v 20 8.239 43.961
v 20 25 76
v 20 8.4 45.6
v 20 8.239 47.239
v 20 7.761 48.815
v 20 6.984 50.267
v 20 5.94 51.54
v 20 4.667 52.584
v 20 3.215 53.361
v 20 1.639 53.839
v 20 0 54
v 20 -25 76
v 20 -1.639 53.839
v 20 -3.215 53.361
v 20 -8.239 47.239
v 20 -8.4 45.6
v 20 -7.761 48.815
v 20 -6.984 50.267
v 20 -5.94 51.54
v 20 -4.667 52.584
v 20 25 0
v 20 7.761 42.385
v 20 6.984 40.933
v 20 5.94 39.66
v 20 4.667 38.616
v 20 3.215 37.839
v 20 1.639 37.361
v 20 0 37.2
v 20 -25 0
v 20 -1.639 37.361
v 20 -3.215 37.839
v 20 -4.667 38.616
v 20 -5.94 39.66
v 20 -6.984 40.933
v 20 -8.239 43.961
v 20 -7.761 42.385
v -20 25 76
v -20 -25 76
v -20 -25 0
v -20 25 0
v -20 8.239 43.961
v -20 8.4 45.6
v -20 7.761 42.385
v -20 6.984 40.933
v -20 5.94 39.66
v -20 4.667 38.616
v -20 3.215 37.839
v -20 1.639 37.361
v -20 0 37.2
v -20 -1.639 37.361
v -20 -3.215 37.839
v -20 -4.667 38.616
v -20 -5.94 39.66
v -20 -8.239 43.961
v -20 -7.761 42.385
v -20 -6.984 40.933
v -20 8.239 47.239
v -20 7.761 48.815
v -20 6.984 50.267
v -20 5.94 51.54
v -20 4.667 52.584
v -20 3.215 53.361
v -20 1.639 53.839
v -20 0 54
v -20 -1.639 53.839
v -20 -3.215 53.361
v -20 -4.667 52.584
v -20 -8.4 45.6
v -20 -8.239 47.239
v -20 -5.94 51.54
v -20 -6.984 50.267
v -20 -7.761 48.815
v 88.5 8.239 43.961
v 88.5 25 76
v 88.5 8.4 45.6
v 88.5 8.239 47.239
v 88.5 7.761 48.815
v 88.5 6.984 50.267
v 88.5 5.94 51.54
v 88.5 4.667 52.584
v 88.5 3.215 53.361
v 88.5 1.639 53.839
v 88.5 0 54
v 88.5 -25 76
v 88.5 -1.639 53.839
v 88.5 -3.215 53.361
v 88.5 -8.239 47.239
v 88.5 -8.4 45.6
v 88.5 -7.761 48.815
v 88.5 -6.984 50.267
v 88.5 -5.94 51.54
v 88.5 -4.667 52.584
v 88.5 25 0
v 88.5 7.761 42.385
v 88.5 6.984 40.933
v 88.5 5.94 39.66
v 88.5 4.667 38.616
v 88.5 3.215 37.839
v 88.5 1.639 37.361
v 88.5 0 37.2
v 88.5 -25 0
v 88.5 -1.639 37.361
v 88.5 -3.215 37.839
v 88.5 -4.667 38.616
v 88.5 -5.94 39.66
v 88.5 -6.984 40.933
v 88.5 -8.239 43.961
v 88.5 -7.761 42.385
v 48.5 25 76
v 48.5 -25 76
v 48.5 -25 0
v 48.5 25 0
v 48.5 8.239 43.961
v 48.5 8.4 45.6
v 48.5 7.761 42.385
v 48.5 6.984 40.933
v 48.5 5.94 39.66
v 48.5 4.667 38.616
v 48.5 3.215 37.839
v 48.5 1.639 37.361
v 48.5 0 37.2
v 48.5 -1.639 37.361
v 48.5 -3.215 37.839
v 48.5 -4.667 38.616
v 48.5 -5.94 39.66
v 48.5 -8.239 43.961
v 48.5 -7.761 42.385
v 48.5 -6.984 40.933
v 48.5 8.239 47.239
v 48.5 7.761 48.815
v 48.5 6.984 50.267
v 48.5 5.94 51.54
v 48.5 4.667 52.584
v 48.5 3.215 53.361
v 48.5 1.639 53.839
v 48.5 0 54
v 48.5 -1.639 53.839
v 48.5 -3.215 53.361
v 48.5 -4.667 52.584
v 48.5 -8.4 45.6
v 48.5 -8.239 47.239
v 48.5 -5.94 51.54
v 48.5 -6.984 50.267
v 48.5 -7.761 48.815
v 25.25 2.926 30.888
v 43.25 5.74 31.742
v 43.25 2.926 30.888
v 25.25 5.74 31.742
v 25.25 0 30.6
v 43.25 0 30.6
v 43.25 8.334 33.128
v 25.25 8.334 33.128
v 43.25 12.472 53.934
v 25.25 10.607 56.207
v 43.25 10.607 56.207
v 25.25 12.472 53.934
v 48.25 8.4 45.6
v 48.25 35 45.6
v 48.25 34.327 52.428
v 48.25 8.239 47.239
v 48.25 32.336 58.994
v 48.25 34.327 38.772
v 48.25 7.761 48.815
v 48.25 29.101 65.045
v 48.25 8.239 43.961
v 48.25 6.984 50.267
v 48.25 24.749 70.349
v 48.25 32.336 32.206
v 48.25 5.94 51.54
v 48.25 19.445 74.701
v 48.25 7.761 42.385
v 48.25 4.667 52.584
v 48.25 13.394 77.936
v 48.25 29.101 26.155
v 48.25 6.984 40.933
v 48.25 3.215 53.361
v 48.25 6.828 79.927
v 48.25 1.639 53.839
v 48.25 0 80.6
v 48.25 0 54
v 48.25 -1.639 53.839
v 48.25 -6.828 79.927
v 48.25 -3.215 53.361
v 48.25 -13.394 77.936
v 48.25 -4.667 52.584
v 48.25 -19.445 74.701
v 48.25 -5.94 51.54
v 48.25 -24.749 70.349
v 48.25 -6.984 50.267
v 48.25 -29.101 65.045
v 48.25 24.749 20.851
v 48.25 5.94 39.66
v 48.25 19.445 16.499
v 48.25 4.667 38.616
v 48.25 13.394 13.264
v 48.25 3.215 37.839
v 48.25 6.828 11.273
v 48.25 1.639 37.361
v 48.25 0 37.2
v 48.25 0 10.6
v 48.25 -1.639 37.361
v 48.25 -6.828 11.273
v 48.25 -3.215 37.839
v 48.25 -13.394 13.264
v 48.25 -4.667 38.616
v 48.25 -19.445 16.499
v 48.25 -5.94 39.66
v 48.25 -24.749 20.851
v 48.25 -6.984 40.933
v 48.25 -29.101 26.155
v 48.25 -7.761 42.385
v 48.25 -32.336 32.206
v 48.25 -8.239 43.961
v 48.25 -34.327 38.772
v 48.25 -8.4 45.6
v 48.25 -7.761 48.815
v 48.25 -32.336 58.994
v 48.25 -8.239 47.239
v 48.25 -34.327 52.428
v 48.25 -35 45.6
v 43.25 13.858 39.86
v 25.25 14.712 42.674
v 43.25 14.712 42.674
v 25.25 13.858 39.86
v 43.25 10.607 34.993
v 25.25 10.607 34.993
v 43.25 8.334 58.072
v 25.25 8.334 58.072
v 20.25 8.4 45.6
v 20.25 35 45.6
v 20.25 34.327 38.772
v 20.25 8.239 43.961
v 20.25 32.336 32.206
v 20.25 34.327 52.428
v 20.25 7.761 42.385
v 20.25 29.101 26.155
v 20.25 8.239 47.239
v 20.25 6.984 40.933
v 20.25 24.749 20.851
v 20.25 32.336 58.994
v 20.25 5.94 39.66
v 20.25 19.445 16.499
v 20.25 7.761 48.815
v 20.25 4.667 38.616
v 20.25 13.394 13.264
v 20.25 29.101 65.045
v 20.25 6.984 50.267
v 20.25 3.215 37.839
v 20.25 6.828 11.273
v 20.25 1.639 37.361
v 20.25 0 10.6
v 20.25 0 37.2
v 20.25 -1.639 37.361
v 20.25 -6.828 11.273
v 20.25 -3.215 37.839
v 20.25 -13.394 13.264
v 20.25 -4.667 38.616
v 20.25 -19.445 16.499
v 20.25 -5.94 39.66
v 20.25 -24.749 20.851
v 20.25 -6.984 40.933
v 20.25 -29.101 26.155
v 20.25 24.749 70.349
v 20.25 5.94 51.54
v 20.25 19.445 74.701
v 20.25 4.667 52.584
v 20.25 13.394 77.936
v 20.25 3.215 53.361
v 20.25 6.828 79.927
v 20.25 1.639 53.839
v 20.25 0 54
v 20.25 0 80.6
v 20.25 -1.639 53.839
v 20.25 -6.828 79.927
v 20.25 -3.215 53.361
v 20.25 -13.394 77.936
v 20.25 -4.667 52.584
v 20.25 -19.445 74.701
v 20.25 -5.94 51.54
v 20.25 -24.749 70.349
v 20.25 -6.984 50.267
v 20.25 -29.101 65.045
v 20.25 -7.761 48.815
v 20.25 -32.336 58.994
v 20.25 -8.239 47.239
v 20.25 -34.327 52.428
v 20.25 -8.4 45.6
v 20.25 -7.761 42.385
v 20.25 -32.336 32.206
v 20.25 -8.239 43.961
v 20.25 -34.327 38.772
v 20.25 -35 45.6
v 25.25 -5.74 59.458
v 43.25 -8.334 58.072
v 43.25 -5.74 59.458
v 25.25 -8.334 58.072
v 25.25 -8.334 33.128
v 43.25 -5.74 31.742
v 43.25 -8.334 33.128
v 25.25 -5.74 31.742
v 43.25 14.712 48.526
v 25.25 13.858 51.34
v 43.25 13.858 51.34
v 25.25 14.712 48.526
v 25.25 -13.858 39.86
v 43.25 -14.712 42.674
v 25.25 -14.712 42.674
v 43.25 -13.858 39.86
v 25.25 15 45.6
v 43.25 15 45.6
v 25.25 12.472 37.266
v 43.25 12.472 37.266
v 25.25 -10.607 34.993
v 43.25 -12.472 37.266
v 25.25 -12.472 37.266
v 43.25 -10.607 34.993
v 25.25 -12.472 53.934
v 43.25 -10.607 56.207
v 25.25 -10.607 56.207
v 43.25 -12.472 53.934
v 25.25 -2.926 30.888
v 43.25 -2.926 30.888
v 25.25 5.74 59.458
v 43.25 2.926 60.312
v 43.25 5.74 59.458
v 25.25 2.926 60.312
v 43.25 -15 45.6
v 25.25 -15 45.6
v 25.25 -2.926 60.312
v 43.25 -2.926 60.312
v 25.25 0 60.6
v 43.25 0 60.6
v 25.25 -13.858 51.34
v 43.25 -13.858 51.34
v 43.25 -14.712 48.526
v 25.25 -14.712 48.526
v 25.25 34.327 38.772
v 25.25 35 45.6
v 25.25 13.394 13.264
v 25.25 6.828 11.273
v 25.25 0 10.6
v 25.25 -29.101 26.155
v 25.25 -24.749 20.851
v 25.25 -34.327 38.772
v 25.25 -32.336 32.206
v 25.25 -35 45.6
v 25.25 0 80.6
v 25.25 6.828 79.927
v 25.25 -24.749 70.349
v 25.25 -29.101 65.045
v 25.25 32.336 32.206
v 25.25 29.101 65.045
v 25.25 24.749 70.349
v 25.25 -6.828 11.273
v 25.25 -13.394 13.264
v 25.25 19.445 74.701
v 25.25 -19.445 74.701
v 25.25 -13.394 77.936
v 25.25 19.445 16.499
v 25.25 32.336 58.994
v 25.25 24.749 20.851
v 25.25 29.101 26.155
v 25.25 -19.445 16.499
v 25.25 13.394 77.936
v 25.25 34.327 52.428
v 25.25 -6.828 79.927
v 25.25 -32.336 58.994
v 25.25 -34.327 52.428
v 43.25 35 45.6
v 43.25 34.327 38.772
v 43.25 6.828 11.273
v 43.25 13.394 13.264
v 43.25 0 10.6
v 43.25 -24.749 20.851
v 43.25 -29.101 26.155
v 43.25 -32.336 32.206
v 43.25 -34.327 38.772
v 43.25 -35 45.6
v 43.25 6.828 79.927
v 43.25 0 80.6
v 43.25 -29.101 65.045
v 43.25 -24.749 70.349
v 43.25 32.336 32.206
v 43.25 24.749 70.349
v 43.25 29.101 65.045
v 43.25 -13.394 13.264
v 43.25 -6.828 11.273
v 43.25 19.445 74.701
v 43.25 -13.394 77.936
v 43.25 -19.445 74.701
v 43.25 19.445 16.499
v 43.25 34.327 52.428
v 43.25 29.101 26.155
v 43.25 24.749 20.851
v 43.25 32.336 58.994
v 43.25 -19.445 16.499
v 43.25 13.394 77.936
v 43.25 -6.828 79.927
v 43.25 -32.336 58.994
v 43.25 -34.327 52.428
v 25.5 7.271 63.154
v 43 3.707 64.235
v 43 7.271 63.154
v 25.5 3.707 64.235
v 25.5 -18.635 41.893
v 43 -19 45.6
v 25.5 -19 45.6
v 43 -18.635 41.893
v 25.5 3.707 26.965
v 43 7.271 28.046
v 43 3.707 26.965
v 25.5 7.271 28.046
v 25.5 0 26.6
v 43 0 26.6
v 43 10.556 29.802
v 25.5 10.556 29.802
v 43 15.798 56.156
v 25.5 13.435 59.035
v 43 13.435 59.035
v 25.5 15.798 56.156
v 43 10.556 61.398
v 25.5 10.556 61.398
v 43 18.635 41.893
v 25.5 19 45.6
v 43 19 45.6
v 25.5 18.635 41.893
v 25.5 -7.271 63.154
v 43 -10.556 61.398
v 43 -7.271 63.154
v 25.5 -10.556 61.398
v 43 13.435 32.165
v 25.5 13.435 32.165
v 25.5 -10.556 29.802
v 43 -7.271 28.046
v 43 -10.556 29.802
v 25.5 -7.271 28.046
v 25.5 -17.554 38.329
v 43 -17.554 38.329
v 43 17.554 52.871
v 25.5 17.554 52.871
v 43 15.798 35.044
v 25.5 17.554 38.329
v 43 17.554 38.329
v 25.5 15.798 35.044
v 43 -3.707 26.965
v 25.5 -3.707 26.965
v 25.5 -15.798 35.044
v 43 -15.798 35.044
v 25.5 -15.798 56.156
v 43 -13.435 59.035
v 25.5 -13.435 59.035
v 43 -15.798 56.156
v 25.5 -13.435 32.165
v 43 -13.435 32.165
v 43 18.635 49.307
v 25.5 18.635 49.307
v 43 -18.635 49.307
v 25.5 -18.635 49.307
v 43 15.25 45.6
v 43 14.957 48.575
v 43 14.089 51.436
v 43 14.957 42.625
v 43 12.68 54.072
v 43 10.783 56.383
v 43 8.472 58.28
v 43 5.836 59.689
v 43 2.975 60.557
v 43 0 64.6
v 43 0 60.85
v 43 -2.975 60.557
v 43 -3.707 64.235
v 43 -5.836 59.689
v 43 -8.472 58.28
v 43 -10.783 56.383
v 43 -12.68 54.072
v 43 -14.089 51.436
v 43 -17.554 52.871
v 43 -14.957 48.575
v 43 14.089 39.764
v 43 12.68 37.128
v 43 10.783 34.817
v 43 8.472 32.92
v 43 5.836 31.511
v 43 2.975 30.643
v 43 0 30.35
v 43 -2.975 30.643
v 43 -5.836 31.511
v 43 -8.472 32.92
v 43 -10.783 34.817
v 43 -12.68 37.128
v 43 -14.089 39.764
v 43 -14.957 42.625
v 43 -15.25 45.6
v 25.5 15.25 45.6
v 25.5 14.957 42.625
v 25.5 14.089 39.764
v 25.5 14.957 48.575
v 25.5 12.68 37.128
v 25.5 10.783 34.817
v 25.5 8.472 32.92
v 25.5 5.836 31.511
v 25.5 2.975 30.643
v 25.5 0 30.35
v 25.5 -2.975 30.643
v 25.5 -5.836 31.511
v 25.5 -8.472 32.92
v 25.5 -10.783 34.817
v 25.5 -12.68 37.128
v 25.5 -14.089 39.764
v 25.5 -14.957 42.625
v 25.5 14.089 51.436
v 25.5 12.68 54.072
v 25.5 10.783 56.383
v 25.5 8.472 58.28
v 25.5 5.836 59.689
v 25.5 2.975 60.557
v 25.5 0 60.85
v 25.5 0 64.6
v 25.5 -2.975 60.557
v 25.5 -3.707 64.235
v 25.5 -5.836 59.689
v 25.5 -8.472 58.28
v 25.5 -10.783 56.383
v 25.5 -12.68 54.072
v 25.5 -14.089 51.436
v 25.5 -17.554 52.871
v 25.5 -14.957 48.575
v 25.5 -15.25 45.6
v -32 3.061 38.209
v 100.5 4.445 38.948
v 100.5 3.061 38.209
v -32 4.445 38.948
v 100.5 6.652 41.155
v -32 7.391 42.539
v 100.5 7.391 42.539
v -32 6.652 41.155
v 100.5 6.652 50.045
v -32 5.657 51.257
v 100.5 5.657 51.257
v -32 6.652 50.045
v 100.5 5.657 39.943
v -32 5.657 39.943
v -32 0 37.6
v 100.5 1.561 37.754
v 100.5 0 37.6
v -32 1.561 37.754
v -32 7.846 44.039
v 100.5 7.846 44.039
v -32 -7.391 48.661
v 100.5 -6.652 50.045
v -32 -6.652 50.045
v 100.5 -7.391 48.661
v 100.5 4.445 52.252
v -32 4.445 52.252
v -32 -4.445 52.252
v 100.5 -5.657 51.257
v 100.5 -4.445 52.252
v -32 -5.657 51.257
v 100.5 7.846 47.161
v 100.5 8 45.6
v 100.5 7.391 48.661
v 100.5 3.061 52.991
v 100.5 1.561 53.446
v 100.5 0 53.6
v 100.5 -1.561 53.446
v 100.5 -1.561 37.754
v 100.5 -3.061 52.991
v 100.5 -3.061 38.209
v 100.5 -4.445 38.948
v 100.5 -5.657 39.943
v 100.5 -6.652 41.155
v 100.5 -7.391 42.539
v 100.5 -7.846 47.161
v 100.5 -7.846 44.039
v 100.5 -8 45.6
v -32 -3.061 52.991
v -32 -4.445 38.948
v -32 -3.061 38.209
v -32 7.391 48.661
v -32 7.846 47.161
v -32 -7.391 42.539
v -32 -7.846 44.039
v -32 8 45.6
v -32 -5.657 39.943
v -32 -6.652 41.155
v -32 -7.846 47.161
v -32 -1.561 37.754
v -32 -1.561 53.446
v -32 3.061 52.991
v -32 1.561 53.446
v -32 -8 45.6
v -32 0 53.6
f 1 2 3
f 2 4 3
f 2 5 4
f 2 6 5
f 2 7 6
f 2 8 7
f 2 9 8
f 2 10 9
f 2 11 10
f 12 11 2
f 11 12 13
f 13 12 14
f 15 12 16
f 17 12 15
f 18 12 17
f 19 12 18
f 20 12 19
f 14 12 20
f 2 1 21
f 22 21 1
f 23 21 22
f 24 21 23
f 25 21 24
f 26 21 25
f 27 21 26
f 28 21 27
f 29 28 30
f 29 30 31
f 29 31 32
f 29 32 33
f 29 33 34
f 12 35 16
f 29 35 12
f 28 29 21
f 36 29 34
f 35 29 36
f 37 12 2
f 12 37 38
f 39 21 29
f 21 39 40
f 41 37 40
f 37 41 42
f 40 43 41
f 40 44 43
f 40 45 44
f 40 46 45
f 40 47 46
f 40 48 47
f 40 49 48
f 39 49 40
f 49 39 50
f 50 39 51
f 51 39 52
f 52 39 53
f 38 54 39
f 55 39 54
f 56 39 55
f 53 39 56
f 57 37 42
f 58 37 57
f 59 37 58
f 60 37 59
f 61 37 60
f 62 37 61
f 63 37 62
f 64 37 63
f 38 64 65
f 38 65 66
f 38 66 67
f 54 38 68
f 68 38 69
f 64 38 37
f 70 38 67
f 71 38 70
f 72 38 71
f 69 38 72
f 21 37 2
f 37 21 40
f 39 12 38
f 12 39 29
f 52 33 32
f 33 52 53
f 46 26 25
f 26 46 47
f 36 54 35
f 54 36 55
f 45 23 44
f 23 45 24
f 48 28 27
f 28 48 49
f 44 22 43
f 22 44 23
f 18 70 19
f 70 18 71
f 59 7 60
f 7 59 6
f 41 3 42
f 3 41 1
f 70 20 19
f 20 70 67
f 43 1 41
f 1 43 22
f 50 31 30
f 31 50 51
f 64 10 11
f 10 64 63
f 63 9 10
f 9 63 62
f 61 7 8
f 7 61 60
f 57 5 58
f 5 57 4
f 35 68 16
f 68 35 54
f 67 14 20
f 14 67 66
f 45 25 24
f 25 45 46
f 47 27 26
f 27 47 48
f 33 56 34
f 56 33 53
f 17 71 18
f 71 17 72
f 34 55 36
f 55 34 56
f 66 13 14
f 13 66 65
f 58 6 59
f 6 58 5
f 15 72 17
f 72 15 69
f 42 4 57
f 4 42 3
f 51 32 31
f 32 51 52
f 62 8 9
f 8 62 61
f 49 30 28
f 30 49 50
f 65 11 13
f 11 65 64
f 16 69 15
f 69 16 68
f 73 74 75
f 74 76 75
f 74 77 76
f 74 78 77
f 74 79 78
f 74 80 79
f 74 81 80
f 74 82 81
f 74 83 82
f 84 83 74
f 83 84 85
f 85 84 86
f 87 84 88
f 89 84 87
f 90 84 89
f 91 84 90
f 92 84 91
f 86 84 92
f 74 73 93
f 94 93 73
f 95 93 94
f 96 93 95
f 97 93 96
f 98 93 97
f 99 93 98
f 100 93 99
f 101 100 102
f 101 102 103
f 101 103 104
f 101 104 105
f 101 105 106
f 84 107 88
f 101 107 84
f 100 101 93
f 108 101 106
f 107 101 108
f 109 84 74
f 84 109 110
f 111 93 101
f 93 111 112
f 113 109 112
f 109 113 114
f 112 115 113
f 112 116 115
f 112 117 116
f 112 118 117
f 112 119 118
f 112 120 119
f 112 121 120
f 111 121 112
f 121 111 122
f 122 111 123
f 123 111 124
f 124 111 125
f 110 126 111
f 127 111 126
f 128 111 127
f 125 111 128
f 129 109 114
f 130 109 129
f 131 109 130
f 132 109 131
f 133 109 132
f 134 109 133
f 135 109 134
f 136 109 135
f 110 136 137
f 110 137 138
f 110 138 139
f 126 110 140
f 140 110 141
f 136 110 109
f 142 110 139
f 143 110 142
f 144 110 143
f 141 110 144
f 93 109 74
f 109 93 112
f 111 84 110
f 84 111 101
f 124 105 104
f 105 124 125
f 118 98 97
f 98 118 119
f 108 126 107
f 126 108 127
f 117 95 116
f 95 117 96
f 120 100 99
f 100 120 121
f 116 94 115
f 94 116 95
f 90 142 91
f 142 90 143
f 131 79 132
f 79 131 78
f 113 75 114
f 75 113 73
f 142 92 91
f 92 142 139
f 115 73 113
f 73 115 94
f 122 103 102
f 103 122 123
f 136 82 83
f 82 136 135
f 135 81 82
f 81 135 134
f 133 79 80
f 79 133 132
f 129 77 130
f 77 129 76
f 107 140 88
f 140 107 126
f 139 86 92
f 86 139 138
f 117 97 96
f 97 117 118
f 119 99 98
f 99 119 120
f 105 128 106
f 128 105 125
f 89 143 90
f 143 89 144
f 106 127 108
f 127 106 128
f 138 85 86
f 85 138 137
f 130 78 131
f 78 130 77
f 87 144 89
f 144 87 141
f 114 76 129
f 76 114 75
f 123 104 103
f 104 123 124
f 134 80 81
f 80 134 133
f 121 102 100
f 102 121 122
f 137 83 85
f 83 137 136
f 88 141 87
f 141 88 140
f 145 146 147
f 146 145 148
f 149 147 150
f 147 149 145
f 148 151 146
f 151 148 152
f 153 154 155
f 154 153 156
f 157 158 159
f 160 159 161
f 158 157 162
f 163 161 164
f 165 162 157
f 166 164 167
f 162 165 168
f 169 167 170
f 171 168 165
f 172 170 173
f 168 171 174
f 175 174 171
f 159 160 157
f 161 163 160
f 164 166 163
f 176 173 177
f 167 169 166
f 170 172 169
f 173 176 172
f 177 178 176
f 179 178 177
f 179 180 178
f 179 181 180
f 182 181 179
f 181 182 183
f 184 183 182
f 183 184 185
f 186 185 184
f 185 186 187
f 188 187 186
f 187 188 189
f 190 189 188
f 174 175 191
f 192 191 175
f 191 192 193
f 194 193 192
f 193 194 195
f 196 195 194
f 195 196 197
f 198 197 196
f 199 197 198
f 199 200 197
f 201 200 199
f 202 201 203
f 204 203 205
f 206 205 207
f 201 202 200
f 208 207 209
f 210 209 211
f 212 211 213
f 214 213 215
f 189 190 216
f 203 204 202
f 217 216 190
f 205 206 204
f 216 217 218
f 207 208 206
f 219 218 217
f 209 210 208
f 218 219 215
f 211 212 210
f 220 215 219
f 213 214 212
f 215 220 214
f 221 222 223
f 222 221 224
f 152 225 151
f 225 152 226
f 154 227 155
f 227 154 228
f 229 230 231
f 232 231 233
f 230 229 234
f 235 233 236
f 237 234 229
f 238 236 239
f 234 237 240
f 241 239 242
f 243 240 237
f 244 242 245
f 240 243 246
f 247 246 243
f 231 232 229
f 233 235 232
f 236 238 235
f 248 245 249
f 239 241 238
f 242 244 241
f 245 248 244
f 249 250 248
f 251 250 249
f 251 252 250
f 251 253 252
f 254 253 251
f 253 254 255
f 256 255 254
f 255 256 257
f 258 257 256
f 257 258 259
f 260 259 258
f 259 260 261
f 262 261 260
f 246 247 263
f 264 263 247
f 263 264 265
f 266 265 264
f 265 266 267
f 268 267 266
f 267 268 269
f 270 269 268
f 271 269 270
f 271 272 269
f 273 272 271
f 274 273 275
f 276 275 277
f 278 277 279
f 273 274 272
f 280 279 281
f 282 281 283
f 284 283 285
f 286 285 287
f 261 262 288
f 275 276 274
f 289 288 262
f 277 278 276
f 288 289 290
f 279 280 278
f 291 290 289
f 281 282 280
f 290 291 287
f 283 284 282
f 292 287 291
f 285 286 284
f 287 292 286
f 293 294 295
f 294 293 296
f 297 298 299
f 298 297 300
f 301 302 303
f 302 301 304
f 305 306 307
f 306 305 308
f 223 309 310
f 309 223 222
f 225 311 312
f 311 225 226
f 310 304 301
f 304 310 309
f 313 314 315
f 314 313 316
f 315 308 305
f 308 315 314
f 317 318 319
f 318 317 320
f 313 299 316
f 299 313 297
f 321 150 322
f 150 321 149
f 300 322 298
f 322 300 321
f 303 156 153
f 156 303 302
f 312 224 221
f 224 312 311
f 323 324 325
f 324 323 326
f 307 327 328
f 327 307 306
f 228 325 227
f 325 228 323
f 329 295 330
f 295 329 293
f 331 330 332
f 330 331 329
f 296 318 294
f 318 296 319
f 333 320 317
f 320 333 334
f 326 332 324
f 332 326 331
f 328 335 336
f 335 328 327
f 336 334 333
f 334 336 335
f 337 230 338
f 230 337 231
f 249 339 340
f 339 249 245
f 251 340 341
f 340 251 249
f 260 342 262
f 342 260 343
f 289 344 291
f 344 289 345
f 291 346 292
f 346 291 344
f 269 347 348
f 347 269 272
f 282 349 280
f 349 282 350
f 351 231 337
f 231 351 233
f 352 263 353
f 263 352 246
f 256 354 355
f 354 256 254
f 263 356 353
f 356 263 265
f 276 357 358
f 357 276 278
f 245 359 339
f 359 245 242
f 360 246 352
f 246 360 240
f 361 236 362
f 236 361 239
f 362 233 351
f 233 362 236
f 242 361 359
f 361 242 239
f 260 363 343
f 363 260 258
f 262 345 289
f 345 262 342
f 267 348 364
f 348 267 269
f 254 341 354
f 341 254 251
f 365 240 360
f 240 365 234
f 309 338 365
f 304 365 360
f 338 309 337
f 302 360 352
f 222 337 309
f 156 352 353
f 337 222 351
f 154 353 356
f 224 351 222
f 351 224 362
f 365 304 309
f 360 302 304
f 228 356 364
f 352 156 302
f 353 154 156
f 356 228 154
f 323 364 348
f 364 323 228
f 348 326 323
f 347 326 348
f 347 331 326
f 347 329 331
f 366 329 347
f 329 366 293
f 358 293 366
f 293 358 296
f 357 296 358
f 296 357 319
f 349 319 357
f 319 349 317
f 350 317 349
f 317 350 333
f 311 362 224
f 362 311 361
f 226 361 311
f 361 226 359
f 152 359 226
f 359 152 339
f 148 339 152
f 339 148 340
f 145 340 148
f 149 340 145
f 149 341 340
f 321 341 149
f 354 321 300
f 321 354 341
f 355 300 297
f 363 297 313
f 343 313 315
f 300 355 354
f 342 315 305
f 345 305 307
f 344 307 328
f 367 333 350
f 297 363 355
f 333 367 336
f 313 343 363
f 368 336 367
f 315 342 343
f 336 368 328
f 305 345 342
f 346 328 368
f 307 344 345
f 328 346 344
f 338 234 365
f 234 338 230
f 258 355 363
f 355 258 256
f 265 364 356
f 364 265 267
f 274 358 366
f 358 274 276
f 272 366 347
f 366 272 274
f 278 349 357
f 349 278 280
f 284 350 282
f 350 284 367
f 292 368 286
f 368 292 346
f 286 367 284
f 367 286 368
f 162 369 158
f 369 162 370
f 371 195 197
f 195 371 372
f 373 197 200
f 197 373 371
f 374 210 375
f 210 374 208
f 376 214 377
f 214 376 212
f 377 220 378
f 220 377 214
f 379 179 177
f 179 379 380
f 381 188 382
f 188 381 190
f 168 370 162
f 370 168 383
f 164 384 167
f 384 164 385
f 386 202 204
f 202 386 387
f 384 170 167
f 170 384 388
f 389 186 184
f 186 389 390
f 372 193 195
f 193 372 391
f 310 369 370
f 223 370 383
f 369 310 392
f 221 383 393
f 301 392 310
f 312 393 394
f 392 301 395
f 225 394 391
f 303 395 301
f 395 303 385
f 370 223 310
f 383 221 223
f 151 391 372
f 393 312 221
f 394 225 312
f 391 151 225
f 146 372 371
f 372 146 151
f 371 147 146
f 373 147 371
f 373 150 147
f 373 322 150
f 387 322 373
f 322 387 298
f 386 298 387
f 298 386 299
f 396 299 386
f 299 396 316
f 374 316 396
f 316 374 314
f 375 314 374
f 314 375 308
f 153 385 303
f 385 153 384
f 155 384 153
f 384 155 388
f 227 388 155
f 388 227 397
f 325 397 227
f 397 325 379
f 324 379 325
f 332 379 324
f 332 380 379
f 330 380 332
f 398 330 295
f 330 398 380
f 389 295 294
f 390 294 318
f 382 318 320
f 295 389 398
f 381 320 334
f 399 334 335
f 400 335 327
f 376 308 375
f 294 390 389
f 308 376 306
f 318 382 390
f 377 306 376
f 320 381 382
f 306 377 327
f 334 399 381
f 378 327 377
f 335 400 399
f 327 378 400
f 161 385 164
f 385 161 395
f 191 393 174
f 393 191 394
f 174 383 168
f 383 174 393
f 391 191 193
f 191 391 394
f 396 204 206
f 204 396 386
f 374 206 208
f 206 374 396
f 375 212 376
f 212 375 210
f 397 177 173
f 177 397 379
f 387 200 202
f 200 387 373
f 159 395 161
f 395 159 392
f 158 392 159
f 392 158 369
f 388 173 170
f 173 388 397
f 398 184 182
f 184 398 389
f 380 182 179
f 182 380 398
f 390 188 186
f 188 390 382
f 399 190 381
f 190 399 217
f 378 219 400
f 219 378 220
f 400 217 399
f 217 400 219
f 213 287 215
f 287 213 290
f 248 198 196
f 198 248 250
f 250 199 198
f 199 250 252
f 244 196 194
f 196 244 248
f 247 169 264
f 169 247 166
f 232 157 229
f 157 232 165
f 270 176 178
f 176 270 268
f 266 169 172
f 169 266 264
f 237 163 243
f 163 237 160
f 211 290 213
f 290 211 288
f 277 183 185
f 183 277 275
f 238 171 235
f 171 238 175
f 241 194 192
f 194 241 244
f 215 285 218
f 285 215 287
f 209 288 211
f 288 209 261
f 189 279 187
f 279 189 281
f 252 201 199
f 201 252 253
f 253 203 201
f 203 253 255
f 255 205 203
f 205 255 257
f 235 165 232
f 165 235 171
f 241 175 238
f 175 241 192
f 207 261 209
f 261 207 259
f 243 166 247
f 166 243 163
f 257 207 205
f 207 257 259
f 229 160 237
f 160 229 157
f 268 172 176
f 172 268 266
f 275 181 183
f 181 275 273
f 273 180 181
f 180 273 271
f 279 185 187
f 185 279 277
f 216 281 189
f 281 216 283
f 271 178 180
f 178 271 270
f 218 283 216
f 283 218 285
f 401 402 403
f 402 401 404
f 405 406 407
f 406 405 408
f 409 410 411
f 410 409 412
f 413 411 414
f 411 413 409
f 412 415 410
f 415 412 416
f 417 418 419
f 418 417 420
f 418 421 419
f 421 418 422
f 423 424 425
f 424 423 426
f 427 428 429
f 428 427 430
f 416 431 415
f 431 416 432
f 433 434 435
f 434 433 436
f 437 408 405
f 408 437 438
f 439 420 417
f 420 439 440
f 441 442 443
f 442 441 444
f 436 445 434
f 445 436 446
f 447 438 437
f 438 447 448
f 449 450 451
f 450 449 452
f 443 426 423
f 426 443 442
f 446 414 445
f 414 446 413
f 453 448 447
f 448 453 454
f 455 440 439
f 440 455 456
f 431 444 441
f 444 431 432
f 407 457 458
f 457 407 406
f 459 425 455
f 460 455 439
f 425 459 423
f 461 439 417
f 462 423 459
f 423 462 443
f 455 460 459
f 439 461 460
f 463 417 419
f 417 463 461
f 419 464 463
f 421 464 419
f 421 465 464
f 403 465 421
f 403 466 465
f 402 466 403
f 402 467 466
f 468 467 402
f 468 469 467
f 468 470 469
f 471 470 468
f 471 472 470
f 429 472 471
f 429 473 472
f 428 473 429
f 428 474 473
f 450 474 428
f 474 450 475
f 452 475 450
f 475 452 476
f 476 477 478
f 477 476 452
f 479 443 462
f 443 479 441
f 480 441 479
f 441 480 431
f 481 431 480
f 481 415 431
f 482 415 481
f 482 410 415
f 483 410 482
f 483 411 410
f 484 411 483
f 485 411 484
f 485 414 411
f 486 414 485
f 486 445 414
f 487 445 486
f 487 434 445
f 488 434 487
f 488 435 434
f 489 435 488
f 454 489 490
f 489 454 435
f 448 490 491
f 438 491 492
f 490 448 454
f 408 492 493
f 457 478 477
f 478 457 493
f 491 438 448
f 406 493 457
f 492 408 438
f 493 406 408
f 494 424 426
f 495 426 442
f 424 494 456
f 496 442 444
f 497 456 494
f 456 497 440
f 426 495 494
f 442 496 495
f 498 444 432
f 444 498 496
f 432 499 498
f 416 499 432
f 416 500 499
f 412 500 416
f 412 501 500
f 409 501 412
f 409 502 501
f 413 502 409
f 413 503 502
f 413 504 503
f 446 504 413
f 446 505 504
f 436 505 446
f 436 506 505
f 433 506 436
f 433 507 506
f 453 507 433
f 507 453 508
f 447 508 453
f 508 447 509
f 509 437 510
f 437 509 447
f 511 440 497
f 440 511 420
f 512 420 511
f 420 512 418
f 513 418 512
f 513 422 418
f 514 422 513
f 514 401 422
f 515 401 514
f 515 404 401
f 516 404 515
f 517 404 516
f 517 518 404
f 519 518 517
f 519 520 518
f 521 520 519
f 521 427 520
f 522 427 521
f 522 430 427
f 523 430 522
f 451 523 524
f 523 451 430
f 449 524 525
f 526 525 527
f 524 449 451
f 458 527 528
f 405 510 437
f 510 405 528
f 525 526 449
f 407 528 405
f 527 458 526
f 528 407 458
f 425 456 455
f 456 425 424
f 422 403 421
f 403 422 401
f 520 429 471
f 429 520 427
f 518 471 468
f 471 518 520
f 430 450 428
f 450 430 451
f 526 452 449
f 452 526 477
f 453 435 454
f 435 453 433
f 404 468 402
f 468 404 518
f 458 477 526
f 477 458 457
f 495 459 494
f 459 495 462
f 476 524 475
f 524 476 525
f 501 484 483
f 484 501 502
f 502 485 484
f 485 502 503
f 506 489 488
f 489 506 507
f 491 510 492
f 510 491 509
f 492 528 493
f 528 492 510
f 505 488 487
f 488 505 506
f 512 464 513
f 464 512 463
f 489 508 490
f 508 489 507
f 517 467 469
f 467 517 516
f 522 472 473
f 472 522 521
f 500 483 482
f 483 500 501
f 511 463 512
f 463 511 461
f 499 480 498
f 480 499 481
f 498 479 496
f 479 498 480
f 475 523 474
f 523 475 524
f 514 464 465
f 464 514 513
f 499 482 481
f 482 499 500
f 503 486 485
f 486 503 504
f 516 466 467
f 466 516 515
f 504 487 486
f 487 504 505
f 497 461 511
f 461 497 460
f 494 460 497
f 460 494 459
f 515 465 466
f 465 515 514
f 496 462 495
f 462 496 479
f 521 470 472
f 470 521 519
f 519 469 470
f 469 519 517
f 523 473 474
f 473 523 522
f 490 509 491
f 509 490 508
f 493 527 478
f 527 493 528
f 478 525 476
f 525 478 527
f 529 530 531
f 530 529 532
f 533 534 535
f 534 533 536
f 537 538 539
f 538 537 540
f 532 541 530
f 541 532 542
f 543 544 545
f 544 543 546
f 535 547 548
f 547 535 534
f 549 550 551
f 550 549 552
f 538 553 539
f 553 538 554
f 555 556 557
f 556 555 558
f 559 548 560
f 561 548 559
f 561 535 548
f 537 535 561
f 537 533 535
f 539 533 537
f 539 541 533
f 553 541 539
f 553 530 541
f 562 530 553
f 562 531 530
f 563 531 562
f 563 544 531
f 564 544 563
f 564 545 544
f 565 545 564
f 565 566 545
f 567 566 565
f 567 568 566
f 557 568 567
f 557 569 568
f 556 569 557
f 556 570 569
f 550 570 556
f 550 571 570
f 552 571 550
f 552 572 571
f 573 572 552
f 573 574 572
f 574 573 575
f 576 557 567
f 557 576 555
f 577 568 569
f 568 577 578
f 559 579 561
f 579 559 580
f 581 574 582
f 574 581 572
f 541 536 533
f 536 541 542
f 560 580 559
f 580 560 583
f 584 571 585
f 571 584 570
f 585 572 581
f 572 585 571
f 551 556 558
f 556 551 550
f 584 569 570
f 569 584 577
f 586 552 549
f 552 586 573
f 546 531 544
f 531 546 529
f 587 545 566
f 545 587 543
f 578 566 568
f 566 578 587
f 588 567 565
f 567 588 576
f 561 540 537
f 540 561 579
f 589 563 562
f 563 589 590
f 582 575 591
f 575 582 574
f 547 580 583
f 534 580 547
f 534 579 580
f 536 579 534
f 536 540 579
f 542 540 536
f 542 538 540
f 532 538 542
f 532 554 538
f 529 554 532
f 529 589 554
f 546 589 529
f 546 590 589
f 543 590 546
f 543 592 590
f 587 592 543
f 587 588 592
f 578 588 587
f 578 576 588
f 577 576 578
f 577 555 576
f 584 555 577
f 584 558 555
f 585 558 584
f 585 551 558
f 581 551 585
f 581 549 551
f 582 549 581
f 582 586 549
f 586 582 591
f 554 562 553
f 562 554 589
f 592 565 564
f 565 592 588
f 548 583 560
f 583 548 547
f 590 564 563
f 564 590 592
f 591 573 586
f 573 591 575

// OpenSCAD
$fn = 32;

// ------------------------------------------------------------------------
// Pulley assembly: d70 pulley with a belt, shaft d16
// Every part is its own module, assembly() places them once.
// ------------------------------------------------------------------------

// --- part 1 ---
module support1() {
  difference() {
    translate([-20, -25, 0]) cube([40, 50, 76]);
    translate([0, 0, 45.6]) rotate([0, 90, 0]) cylinder(h = 42, d = 16.8, center = true);
  }
}

// --- part 2 ---
module support2() {
  difference() {
    translate([-20, -25, 0]) cube([40, 50, 76]);
    translate([0, 0, 45.6]) rotate([0, 90, 0]) cylinder(h = 42, d = 16.8, center = true);
  }
}

// --- part 3 ---
module shaft() {
  translate([0, 0, -66.25]) cylinder(h = 132.5, d = 16);
}

// --- part 4 ---
module pulley() {
  difference() {
    union() {
      cylinder(h = 28, d = 30);
      cylinder(h = 5, d = 70);
      translate([0, 0, 23]) cylinder(h = 5, d = 70);
    }
    translate([0, 0, -1]) cylinder(h = 30, d = 16.8);
  }
}

// --- part 5 ---
module belt() {
  difference() {
      translate([0, 0, 0]) cylinder(h = 17.5, d = 38);
      translate([0, 0, -1]) cylinder(h = 19.5, d = 30.5);
    }
}

// --- assembly ---
module assembly() {
  translate([0, 0, 0]) rotate([0, 0, 0]) support1();
  translate([68.5, 0, 0]) rotate([0, 0, 0]) support2();
  translate([34.25, 0, 45.6]) rotate([0, 90, 0]) shaft();
  translate([20.25, 0, 45.6]) rotate([0, 90, 0]) pulley();
  translate([25.5, 0, 45.6]) rotate([0, 90, 0]) belt();
}

assembly();
